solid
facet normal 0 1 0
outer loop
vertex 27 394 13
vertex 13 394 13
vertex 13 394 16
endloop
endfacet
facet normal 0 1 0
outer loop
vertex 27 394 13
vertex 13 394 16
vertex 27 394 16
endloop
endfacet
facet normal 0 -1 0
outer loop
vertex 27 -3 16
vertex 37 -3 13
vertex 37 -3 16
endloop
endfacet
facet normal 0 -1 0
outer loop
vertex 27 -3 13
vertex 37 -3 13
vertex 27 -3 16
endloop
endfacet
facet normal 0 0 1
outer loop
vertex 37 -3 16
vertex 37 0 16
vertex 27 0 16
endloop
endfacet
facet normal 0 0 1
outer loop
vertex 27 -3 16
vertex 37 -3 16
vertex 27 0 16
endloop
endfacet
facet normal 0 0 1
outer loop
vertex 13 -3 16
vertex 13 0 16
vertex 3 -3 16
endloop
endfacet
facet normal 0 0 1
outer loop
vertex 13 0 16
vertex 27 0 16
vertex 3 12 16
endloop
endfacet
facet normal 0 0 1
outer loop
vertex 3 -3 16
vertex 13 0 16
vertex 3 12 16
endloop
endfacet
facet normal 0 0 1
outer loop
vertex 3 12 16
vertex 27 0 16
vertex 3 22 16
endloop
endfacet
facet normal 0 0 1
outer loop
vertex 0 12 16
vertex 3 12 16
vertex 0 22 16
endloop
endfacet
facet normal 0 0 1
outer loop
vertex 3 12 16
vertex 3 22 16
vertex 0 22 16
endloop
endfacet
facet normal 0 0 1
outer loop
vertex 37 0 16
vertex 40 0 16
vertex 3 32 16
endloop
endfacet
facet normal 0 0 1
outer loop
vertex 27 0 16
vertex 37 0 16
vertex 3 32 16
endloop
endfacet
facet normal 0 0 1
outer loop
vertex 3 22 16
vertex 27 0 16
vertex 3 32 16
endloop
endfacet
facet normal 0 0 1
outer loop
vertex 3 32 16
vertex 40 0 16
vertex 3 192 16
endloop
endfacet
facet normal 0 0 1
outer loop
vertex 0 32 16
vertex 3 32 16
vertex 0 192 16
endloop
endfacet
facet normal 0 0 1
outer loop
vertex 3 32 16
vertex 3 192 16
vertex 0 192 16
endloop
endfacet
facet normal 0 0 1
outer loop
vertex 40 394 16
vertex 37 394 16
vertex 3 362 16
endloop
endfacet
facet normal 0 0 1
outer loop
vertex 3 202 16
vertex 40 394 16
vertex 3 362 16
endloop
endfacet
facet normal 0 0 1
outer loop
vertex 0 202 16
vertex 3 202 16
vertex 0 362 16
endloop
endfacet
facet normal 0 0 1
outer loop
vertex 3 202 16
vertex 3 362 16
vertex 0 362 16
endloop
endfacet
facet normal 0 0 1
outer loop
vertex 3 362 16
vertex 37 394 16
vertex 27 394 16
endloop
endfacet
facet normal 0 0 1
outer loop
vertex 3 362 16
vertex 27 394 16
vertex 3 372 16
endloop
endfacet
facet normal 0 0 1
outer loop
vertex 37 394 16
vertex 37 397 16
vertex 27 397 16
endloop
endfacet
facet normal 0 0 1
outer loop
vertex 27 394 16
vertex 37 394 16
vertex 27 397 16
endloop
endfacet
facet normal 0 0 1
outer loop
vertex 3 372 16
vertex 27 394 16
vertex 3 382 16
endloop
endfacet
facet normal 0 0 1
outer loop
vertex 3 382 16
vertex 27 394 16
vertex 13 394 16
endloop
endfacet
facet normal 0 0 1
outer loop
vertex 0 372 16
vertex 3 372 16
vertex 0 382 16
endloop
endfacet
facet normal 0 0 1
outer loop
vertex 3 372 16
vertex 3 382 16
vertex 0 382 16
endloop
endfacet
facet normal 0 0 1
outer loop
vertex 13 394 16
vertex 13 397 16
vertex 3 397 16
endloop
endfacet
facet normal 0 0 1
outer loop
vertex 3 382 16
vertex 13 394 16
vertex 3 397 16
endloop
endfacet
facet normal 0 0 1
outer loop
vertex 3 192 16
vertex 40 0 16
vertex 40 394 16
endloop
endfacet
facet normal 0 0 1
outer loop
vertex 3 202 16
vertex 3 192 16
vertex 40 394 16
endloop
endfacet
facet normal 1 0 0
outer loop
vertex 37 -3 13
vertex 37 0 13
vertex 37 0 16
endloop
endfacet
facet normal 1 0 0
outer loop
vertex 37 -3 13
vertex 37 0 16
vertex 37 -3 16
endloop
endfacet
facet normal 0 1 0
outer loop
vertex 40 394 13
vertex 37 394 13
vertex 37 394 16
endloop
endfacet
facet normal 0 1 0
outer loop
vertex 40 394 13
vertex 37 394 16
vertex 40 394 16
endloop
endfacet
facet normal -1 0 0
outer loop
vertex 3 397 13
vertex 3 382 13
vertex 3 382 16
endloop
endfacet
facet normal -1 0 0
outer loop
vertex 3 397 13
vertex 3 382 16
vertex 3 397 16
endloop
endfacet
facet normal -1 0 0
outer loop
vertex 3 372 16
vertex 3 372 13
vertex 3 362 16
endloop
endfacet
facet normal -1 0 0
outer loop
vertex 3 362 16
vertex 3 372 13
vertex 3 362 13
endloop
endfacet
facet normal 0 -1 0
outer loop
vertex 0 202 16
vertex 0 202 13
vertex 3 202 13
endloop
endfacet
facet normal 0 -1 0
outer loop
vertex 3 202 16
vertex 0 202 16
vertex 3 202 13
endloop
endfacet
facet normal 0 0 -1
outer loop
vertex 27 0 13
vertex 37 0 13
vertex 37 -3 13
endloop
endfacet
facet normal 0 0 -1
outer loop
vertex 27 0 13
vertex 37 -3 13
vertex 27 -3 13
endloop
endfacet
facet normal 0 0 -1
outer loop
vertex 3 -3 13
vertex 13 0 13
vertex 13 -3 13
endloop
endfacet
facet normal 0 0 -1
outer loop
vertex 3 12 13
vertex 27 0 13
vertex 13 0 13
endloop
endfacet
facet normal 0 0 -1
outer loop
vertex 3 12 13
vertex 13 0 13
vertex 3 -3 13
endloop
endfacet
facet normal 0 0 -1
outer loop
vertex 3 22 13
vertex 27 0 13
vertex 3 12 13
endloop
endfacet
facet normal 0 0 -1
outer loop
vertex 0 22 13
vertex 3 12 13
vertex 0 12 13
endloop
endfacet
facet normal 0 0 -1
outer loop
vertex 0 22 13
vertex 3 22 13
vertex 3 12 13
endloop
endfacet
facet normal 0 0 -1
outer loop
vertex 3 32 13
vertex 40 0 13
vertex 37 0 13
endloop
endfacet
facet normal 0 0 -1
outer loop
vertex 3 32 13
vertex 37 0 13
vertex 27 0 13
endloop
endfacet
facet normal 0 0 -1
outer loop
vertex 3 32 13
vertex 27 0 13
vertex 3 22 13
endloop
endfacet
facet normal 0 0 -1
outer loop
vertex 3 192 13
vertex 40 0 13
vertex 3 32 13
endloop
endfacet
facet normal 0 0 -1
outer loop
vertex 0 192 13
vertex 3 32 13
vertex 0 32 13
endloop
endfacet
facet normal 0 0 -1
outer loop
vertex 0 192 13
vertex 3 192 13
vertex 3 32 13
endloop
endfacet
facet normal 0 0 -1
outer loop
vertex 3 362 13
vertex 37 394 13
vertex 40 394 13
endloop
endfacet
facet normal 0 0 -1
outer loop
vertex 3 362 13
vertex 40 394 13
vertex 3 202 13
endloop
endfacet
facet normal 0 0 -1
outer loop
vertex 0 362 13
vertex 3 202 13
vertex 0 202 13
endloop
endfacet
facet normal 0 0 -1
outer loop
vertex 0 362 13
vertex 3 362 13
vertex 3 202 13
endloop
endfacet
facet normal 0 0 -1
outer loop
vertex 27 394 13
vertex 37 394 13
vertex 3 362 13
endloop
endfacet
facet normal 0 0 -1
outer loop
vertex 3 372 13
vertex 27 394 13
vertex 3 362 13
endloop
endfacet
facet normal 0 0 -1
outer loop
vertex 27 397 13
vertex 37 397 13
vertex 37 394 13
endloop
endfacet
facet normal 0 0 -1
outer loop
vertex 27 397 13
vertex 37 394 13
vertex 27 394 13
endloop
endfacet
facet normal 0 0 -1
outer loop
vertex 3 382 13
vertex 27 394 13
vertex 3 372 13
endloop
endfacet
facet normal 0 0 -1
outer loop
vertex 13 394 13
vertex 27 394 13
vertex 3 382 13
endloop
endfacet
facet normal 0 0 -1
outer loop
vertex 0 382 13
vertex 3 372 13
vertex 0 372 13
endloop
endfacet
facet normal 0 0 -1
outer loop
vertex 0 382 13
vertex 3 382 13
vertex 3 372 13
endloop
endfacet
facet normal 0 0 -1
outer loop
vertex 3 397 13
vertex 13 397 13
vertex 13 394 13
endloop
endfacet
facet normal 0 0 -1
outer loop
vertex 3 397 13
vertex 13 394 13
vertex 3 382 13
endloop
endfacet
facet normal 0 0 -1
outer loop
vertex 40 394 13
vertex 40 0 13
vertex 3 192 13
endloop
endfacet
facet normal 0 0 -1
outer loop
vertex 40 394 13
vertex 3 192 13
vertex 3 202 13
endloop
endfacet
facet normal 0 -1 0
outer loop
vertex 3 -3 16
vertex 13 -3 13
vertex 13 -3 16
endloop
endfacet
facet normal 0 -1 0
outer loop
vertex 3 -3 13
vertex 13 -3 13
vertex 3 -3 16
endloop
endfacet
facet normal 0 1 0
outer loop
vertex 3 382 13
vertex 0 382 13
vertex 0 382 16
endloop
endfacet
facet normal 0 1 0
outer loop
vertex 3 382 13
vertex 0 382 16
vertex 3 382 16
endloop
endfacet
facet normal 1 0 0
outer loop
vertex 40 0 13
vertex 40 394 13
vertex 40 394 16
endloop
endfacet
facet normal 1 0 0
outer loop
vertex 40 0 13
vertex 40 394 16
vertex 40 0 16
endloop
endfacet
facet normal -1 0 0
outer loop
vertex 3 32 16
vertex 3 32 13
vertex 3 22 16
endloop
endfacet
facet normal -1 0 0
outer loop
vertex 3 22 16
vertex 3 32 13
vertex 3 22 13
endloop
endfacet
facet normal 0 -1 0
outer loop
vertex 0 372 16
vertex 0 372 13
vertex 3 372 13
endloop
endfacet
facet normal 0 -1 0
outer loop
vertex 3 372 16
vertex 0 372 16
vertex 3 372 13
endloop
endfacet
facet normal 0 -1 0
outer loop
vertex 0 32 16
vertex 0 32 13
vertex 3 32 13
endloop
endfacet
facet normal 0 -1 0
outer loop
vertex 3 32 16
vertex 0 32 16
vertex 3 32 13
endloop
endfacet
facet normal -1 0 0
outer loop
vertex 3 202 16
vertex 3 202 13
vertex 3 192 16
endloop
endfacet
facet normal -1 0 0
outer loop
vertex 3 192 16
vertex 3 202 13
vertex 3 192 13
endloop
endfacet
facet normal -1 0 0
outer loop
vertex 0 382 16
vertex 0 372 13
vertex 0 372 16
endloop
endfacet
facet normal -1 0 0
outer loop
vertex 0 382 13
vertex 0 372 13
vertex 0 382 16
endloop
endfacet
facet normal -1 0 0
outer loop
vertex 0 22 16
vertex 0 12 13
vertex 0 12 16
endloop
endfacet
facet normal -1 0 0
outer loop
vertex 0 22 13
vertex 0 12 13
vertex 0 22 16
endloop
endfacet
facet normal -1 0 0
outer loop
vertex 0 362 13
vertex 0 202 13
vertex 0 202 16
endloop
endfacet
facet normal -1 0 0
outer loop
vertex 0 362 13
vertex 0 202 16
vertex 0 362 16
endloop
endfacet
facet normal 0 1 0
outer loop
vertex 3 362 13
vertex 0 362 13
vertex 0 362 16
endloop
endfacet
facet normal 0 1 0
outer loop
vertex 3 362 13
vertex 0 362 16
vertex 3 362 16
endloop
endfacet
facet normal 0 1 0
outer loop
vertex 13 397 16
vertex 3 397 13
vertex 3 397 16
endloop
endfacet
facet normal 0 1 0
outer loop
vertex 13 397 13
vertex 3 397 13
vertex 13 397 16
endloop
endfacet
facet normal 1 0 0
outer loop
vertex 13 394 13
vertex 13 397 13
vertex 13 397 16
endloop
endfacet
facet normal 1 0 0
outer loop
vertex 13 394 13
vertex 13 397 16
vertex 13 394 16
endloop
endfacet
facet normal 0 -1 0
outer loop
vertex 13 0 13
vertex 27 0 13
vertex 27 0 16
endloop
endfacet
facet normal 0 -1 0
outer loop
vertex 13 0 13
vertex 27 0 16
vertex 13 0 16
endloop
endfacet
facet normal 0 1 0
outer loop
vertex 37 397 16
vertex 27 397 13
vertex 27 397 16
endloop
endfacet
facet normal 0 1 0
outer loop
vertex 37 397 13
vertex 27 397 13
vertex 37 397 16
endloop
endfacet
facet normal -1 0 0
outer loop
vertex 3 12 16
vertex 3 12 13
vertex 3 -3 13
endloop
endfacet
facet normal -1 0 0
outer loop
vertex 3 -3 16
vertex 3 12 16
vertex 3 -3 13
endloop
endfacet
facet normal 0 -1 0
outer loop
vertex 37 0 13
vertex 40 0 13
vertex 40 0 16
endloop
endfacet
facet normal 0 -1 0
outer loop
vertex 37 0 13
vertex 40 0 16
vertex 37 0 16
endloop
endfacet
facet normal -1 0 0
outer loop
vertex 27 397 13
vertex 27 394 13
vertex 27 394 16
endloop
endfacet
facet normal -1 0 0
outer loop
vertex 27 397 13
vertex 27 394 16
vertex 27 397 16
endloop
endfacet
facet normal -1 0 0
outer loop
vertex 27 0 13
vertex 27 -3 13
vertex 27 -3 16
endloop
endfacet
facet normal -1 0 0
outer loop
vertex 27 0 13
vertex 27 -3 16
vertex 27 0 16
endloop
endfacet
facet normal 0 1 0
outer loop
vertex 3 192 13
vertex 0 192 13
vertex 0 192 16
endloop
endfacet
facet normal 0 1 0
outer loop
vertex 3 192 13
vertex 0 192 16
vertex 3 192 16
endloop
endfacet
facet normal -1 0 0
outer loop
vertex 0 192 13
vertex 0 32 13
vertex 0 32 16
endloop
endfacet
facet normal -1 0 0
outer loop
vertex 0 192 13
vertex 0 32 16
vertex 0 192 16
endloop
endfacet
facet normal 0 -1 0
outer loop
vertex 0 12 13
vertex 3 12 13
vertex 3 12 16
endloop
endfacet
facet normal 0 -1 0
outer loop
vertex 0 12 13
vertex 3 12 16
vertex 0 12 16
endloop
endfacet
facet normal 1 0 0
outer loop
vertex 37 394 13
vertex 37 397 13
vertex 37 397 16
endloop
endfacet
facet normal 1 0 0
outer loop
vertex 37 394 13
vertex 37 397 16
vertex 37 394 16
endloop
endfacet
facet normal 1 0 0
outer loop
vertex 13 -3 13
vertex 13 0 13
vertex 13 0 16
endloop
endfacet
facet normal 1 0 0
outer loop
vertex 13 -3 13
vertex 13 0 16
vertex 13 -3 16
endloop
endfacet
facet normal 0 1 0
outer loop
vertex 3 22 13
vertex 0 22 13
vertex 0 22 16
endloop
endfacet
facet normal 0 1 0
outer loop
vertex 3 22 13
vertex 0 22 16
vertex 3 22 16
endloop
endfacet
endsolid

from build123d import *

# Parameters (mm, degrees)
PAD004_DEPTH           = 3
SKETCH007_W            = 3
SKETCH007_H            = 10
POCKET002_DEPTH        = 3
LINEARPATTERN002_COUNT = 3
LINEARPATTERN002_PITCH = 170


with BuildPart() as part:
    # Sketch006 → Pad004 (new body)
    with BuildSketch(Plane.XY):
        Polygon((40, 0), (37, 0), (37, -3), (27, -3), (27, 0), (13, 0), (13, -3), (3, -3), (3, 0), (3, 12), (0, 12), (0, 382), (3, 382), (3, 397), (13, 397), (13, 394), (27, 394), (27, 397), (37, 397), (37, 394), (40, 394), align=None)
    extrude(amount=PAD004_DEPTH)

    # Sketch007 → Pocket002 (cut)
    with BuildSketch(Plane(origin=(0, 0, 0), x_dir=(1, 0, 0), z_dir=(0, 0, -1))):
        with Locations((1.5, -27)):
            Rectangle(SKETCH007_W, SKETCH007_H)
    pocket002 = extrude(amount=-POCKET002_DEPTH, mode=Mode.SUBTRACT)

    # LinearPattern002: Pocket002 ×3
    with Locations(*[(0, i * LINEARPATTERN002_PITCH, 0) for i in range(1, LINEARPATTERN002_COUNT)]):
        add(pocket002, mode=Mode.SUBTRACT)


with BuildPart() as part_1:
    # Body004 placement: moved
    add(part.part.moved(Location((0, 0, 13))))


solid = part_1.part
